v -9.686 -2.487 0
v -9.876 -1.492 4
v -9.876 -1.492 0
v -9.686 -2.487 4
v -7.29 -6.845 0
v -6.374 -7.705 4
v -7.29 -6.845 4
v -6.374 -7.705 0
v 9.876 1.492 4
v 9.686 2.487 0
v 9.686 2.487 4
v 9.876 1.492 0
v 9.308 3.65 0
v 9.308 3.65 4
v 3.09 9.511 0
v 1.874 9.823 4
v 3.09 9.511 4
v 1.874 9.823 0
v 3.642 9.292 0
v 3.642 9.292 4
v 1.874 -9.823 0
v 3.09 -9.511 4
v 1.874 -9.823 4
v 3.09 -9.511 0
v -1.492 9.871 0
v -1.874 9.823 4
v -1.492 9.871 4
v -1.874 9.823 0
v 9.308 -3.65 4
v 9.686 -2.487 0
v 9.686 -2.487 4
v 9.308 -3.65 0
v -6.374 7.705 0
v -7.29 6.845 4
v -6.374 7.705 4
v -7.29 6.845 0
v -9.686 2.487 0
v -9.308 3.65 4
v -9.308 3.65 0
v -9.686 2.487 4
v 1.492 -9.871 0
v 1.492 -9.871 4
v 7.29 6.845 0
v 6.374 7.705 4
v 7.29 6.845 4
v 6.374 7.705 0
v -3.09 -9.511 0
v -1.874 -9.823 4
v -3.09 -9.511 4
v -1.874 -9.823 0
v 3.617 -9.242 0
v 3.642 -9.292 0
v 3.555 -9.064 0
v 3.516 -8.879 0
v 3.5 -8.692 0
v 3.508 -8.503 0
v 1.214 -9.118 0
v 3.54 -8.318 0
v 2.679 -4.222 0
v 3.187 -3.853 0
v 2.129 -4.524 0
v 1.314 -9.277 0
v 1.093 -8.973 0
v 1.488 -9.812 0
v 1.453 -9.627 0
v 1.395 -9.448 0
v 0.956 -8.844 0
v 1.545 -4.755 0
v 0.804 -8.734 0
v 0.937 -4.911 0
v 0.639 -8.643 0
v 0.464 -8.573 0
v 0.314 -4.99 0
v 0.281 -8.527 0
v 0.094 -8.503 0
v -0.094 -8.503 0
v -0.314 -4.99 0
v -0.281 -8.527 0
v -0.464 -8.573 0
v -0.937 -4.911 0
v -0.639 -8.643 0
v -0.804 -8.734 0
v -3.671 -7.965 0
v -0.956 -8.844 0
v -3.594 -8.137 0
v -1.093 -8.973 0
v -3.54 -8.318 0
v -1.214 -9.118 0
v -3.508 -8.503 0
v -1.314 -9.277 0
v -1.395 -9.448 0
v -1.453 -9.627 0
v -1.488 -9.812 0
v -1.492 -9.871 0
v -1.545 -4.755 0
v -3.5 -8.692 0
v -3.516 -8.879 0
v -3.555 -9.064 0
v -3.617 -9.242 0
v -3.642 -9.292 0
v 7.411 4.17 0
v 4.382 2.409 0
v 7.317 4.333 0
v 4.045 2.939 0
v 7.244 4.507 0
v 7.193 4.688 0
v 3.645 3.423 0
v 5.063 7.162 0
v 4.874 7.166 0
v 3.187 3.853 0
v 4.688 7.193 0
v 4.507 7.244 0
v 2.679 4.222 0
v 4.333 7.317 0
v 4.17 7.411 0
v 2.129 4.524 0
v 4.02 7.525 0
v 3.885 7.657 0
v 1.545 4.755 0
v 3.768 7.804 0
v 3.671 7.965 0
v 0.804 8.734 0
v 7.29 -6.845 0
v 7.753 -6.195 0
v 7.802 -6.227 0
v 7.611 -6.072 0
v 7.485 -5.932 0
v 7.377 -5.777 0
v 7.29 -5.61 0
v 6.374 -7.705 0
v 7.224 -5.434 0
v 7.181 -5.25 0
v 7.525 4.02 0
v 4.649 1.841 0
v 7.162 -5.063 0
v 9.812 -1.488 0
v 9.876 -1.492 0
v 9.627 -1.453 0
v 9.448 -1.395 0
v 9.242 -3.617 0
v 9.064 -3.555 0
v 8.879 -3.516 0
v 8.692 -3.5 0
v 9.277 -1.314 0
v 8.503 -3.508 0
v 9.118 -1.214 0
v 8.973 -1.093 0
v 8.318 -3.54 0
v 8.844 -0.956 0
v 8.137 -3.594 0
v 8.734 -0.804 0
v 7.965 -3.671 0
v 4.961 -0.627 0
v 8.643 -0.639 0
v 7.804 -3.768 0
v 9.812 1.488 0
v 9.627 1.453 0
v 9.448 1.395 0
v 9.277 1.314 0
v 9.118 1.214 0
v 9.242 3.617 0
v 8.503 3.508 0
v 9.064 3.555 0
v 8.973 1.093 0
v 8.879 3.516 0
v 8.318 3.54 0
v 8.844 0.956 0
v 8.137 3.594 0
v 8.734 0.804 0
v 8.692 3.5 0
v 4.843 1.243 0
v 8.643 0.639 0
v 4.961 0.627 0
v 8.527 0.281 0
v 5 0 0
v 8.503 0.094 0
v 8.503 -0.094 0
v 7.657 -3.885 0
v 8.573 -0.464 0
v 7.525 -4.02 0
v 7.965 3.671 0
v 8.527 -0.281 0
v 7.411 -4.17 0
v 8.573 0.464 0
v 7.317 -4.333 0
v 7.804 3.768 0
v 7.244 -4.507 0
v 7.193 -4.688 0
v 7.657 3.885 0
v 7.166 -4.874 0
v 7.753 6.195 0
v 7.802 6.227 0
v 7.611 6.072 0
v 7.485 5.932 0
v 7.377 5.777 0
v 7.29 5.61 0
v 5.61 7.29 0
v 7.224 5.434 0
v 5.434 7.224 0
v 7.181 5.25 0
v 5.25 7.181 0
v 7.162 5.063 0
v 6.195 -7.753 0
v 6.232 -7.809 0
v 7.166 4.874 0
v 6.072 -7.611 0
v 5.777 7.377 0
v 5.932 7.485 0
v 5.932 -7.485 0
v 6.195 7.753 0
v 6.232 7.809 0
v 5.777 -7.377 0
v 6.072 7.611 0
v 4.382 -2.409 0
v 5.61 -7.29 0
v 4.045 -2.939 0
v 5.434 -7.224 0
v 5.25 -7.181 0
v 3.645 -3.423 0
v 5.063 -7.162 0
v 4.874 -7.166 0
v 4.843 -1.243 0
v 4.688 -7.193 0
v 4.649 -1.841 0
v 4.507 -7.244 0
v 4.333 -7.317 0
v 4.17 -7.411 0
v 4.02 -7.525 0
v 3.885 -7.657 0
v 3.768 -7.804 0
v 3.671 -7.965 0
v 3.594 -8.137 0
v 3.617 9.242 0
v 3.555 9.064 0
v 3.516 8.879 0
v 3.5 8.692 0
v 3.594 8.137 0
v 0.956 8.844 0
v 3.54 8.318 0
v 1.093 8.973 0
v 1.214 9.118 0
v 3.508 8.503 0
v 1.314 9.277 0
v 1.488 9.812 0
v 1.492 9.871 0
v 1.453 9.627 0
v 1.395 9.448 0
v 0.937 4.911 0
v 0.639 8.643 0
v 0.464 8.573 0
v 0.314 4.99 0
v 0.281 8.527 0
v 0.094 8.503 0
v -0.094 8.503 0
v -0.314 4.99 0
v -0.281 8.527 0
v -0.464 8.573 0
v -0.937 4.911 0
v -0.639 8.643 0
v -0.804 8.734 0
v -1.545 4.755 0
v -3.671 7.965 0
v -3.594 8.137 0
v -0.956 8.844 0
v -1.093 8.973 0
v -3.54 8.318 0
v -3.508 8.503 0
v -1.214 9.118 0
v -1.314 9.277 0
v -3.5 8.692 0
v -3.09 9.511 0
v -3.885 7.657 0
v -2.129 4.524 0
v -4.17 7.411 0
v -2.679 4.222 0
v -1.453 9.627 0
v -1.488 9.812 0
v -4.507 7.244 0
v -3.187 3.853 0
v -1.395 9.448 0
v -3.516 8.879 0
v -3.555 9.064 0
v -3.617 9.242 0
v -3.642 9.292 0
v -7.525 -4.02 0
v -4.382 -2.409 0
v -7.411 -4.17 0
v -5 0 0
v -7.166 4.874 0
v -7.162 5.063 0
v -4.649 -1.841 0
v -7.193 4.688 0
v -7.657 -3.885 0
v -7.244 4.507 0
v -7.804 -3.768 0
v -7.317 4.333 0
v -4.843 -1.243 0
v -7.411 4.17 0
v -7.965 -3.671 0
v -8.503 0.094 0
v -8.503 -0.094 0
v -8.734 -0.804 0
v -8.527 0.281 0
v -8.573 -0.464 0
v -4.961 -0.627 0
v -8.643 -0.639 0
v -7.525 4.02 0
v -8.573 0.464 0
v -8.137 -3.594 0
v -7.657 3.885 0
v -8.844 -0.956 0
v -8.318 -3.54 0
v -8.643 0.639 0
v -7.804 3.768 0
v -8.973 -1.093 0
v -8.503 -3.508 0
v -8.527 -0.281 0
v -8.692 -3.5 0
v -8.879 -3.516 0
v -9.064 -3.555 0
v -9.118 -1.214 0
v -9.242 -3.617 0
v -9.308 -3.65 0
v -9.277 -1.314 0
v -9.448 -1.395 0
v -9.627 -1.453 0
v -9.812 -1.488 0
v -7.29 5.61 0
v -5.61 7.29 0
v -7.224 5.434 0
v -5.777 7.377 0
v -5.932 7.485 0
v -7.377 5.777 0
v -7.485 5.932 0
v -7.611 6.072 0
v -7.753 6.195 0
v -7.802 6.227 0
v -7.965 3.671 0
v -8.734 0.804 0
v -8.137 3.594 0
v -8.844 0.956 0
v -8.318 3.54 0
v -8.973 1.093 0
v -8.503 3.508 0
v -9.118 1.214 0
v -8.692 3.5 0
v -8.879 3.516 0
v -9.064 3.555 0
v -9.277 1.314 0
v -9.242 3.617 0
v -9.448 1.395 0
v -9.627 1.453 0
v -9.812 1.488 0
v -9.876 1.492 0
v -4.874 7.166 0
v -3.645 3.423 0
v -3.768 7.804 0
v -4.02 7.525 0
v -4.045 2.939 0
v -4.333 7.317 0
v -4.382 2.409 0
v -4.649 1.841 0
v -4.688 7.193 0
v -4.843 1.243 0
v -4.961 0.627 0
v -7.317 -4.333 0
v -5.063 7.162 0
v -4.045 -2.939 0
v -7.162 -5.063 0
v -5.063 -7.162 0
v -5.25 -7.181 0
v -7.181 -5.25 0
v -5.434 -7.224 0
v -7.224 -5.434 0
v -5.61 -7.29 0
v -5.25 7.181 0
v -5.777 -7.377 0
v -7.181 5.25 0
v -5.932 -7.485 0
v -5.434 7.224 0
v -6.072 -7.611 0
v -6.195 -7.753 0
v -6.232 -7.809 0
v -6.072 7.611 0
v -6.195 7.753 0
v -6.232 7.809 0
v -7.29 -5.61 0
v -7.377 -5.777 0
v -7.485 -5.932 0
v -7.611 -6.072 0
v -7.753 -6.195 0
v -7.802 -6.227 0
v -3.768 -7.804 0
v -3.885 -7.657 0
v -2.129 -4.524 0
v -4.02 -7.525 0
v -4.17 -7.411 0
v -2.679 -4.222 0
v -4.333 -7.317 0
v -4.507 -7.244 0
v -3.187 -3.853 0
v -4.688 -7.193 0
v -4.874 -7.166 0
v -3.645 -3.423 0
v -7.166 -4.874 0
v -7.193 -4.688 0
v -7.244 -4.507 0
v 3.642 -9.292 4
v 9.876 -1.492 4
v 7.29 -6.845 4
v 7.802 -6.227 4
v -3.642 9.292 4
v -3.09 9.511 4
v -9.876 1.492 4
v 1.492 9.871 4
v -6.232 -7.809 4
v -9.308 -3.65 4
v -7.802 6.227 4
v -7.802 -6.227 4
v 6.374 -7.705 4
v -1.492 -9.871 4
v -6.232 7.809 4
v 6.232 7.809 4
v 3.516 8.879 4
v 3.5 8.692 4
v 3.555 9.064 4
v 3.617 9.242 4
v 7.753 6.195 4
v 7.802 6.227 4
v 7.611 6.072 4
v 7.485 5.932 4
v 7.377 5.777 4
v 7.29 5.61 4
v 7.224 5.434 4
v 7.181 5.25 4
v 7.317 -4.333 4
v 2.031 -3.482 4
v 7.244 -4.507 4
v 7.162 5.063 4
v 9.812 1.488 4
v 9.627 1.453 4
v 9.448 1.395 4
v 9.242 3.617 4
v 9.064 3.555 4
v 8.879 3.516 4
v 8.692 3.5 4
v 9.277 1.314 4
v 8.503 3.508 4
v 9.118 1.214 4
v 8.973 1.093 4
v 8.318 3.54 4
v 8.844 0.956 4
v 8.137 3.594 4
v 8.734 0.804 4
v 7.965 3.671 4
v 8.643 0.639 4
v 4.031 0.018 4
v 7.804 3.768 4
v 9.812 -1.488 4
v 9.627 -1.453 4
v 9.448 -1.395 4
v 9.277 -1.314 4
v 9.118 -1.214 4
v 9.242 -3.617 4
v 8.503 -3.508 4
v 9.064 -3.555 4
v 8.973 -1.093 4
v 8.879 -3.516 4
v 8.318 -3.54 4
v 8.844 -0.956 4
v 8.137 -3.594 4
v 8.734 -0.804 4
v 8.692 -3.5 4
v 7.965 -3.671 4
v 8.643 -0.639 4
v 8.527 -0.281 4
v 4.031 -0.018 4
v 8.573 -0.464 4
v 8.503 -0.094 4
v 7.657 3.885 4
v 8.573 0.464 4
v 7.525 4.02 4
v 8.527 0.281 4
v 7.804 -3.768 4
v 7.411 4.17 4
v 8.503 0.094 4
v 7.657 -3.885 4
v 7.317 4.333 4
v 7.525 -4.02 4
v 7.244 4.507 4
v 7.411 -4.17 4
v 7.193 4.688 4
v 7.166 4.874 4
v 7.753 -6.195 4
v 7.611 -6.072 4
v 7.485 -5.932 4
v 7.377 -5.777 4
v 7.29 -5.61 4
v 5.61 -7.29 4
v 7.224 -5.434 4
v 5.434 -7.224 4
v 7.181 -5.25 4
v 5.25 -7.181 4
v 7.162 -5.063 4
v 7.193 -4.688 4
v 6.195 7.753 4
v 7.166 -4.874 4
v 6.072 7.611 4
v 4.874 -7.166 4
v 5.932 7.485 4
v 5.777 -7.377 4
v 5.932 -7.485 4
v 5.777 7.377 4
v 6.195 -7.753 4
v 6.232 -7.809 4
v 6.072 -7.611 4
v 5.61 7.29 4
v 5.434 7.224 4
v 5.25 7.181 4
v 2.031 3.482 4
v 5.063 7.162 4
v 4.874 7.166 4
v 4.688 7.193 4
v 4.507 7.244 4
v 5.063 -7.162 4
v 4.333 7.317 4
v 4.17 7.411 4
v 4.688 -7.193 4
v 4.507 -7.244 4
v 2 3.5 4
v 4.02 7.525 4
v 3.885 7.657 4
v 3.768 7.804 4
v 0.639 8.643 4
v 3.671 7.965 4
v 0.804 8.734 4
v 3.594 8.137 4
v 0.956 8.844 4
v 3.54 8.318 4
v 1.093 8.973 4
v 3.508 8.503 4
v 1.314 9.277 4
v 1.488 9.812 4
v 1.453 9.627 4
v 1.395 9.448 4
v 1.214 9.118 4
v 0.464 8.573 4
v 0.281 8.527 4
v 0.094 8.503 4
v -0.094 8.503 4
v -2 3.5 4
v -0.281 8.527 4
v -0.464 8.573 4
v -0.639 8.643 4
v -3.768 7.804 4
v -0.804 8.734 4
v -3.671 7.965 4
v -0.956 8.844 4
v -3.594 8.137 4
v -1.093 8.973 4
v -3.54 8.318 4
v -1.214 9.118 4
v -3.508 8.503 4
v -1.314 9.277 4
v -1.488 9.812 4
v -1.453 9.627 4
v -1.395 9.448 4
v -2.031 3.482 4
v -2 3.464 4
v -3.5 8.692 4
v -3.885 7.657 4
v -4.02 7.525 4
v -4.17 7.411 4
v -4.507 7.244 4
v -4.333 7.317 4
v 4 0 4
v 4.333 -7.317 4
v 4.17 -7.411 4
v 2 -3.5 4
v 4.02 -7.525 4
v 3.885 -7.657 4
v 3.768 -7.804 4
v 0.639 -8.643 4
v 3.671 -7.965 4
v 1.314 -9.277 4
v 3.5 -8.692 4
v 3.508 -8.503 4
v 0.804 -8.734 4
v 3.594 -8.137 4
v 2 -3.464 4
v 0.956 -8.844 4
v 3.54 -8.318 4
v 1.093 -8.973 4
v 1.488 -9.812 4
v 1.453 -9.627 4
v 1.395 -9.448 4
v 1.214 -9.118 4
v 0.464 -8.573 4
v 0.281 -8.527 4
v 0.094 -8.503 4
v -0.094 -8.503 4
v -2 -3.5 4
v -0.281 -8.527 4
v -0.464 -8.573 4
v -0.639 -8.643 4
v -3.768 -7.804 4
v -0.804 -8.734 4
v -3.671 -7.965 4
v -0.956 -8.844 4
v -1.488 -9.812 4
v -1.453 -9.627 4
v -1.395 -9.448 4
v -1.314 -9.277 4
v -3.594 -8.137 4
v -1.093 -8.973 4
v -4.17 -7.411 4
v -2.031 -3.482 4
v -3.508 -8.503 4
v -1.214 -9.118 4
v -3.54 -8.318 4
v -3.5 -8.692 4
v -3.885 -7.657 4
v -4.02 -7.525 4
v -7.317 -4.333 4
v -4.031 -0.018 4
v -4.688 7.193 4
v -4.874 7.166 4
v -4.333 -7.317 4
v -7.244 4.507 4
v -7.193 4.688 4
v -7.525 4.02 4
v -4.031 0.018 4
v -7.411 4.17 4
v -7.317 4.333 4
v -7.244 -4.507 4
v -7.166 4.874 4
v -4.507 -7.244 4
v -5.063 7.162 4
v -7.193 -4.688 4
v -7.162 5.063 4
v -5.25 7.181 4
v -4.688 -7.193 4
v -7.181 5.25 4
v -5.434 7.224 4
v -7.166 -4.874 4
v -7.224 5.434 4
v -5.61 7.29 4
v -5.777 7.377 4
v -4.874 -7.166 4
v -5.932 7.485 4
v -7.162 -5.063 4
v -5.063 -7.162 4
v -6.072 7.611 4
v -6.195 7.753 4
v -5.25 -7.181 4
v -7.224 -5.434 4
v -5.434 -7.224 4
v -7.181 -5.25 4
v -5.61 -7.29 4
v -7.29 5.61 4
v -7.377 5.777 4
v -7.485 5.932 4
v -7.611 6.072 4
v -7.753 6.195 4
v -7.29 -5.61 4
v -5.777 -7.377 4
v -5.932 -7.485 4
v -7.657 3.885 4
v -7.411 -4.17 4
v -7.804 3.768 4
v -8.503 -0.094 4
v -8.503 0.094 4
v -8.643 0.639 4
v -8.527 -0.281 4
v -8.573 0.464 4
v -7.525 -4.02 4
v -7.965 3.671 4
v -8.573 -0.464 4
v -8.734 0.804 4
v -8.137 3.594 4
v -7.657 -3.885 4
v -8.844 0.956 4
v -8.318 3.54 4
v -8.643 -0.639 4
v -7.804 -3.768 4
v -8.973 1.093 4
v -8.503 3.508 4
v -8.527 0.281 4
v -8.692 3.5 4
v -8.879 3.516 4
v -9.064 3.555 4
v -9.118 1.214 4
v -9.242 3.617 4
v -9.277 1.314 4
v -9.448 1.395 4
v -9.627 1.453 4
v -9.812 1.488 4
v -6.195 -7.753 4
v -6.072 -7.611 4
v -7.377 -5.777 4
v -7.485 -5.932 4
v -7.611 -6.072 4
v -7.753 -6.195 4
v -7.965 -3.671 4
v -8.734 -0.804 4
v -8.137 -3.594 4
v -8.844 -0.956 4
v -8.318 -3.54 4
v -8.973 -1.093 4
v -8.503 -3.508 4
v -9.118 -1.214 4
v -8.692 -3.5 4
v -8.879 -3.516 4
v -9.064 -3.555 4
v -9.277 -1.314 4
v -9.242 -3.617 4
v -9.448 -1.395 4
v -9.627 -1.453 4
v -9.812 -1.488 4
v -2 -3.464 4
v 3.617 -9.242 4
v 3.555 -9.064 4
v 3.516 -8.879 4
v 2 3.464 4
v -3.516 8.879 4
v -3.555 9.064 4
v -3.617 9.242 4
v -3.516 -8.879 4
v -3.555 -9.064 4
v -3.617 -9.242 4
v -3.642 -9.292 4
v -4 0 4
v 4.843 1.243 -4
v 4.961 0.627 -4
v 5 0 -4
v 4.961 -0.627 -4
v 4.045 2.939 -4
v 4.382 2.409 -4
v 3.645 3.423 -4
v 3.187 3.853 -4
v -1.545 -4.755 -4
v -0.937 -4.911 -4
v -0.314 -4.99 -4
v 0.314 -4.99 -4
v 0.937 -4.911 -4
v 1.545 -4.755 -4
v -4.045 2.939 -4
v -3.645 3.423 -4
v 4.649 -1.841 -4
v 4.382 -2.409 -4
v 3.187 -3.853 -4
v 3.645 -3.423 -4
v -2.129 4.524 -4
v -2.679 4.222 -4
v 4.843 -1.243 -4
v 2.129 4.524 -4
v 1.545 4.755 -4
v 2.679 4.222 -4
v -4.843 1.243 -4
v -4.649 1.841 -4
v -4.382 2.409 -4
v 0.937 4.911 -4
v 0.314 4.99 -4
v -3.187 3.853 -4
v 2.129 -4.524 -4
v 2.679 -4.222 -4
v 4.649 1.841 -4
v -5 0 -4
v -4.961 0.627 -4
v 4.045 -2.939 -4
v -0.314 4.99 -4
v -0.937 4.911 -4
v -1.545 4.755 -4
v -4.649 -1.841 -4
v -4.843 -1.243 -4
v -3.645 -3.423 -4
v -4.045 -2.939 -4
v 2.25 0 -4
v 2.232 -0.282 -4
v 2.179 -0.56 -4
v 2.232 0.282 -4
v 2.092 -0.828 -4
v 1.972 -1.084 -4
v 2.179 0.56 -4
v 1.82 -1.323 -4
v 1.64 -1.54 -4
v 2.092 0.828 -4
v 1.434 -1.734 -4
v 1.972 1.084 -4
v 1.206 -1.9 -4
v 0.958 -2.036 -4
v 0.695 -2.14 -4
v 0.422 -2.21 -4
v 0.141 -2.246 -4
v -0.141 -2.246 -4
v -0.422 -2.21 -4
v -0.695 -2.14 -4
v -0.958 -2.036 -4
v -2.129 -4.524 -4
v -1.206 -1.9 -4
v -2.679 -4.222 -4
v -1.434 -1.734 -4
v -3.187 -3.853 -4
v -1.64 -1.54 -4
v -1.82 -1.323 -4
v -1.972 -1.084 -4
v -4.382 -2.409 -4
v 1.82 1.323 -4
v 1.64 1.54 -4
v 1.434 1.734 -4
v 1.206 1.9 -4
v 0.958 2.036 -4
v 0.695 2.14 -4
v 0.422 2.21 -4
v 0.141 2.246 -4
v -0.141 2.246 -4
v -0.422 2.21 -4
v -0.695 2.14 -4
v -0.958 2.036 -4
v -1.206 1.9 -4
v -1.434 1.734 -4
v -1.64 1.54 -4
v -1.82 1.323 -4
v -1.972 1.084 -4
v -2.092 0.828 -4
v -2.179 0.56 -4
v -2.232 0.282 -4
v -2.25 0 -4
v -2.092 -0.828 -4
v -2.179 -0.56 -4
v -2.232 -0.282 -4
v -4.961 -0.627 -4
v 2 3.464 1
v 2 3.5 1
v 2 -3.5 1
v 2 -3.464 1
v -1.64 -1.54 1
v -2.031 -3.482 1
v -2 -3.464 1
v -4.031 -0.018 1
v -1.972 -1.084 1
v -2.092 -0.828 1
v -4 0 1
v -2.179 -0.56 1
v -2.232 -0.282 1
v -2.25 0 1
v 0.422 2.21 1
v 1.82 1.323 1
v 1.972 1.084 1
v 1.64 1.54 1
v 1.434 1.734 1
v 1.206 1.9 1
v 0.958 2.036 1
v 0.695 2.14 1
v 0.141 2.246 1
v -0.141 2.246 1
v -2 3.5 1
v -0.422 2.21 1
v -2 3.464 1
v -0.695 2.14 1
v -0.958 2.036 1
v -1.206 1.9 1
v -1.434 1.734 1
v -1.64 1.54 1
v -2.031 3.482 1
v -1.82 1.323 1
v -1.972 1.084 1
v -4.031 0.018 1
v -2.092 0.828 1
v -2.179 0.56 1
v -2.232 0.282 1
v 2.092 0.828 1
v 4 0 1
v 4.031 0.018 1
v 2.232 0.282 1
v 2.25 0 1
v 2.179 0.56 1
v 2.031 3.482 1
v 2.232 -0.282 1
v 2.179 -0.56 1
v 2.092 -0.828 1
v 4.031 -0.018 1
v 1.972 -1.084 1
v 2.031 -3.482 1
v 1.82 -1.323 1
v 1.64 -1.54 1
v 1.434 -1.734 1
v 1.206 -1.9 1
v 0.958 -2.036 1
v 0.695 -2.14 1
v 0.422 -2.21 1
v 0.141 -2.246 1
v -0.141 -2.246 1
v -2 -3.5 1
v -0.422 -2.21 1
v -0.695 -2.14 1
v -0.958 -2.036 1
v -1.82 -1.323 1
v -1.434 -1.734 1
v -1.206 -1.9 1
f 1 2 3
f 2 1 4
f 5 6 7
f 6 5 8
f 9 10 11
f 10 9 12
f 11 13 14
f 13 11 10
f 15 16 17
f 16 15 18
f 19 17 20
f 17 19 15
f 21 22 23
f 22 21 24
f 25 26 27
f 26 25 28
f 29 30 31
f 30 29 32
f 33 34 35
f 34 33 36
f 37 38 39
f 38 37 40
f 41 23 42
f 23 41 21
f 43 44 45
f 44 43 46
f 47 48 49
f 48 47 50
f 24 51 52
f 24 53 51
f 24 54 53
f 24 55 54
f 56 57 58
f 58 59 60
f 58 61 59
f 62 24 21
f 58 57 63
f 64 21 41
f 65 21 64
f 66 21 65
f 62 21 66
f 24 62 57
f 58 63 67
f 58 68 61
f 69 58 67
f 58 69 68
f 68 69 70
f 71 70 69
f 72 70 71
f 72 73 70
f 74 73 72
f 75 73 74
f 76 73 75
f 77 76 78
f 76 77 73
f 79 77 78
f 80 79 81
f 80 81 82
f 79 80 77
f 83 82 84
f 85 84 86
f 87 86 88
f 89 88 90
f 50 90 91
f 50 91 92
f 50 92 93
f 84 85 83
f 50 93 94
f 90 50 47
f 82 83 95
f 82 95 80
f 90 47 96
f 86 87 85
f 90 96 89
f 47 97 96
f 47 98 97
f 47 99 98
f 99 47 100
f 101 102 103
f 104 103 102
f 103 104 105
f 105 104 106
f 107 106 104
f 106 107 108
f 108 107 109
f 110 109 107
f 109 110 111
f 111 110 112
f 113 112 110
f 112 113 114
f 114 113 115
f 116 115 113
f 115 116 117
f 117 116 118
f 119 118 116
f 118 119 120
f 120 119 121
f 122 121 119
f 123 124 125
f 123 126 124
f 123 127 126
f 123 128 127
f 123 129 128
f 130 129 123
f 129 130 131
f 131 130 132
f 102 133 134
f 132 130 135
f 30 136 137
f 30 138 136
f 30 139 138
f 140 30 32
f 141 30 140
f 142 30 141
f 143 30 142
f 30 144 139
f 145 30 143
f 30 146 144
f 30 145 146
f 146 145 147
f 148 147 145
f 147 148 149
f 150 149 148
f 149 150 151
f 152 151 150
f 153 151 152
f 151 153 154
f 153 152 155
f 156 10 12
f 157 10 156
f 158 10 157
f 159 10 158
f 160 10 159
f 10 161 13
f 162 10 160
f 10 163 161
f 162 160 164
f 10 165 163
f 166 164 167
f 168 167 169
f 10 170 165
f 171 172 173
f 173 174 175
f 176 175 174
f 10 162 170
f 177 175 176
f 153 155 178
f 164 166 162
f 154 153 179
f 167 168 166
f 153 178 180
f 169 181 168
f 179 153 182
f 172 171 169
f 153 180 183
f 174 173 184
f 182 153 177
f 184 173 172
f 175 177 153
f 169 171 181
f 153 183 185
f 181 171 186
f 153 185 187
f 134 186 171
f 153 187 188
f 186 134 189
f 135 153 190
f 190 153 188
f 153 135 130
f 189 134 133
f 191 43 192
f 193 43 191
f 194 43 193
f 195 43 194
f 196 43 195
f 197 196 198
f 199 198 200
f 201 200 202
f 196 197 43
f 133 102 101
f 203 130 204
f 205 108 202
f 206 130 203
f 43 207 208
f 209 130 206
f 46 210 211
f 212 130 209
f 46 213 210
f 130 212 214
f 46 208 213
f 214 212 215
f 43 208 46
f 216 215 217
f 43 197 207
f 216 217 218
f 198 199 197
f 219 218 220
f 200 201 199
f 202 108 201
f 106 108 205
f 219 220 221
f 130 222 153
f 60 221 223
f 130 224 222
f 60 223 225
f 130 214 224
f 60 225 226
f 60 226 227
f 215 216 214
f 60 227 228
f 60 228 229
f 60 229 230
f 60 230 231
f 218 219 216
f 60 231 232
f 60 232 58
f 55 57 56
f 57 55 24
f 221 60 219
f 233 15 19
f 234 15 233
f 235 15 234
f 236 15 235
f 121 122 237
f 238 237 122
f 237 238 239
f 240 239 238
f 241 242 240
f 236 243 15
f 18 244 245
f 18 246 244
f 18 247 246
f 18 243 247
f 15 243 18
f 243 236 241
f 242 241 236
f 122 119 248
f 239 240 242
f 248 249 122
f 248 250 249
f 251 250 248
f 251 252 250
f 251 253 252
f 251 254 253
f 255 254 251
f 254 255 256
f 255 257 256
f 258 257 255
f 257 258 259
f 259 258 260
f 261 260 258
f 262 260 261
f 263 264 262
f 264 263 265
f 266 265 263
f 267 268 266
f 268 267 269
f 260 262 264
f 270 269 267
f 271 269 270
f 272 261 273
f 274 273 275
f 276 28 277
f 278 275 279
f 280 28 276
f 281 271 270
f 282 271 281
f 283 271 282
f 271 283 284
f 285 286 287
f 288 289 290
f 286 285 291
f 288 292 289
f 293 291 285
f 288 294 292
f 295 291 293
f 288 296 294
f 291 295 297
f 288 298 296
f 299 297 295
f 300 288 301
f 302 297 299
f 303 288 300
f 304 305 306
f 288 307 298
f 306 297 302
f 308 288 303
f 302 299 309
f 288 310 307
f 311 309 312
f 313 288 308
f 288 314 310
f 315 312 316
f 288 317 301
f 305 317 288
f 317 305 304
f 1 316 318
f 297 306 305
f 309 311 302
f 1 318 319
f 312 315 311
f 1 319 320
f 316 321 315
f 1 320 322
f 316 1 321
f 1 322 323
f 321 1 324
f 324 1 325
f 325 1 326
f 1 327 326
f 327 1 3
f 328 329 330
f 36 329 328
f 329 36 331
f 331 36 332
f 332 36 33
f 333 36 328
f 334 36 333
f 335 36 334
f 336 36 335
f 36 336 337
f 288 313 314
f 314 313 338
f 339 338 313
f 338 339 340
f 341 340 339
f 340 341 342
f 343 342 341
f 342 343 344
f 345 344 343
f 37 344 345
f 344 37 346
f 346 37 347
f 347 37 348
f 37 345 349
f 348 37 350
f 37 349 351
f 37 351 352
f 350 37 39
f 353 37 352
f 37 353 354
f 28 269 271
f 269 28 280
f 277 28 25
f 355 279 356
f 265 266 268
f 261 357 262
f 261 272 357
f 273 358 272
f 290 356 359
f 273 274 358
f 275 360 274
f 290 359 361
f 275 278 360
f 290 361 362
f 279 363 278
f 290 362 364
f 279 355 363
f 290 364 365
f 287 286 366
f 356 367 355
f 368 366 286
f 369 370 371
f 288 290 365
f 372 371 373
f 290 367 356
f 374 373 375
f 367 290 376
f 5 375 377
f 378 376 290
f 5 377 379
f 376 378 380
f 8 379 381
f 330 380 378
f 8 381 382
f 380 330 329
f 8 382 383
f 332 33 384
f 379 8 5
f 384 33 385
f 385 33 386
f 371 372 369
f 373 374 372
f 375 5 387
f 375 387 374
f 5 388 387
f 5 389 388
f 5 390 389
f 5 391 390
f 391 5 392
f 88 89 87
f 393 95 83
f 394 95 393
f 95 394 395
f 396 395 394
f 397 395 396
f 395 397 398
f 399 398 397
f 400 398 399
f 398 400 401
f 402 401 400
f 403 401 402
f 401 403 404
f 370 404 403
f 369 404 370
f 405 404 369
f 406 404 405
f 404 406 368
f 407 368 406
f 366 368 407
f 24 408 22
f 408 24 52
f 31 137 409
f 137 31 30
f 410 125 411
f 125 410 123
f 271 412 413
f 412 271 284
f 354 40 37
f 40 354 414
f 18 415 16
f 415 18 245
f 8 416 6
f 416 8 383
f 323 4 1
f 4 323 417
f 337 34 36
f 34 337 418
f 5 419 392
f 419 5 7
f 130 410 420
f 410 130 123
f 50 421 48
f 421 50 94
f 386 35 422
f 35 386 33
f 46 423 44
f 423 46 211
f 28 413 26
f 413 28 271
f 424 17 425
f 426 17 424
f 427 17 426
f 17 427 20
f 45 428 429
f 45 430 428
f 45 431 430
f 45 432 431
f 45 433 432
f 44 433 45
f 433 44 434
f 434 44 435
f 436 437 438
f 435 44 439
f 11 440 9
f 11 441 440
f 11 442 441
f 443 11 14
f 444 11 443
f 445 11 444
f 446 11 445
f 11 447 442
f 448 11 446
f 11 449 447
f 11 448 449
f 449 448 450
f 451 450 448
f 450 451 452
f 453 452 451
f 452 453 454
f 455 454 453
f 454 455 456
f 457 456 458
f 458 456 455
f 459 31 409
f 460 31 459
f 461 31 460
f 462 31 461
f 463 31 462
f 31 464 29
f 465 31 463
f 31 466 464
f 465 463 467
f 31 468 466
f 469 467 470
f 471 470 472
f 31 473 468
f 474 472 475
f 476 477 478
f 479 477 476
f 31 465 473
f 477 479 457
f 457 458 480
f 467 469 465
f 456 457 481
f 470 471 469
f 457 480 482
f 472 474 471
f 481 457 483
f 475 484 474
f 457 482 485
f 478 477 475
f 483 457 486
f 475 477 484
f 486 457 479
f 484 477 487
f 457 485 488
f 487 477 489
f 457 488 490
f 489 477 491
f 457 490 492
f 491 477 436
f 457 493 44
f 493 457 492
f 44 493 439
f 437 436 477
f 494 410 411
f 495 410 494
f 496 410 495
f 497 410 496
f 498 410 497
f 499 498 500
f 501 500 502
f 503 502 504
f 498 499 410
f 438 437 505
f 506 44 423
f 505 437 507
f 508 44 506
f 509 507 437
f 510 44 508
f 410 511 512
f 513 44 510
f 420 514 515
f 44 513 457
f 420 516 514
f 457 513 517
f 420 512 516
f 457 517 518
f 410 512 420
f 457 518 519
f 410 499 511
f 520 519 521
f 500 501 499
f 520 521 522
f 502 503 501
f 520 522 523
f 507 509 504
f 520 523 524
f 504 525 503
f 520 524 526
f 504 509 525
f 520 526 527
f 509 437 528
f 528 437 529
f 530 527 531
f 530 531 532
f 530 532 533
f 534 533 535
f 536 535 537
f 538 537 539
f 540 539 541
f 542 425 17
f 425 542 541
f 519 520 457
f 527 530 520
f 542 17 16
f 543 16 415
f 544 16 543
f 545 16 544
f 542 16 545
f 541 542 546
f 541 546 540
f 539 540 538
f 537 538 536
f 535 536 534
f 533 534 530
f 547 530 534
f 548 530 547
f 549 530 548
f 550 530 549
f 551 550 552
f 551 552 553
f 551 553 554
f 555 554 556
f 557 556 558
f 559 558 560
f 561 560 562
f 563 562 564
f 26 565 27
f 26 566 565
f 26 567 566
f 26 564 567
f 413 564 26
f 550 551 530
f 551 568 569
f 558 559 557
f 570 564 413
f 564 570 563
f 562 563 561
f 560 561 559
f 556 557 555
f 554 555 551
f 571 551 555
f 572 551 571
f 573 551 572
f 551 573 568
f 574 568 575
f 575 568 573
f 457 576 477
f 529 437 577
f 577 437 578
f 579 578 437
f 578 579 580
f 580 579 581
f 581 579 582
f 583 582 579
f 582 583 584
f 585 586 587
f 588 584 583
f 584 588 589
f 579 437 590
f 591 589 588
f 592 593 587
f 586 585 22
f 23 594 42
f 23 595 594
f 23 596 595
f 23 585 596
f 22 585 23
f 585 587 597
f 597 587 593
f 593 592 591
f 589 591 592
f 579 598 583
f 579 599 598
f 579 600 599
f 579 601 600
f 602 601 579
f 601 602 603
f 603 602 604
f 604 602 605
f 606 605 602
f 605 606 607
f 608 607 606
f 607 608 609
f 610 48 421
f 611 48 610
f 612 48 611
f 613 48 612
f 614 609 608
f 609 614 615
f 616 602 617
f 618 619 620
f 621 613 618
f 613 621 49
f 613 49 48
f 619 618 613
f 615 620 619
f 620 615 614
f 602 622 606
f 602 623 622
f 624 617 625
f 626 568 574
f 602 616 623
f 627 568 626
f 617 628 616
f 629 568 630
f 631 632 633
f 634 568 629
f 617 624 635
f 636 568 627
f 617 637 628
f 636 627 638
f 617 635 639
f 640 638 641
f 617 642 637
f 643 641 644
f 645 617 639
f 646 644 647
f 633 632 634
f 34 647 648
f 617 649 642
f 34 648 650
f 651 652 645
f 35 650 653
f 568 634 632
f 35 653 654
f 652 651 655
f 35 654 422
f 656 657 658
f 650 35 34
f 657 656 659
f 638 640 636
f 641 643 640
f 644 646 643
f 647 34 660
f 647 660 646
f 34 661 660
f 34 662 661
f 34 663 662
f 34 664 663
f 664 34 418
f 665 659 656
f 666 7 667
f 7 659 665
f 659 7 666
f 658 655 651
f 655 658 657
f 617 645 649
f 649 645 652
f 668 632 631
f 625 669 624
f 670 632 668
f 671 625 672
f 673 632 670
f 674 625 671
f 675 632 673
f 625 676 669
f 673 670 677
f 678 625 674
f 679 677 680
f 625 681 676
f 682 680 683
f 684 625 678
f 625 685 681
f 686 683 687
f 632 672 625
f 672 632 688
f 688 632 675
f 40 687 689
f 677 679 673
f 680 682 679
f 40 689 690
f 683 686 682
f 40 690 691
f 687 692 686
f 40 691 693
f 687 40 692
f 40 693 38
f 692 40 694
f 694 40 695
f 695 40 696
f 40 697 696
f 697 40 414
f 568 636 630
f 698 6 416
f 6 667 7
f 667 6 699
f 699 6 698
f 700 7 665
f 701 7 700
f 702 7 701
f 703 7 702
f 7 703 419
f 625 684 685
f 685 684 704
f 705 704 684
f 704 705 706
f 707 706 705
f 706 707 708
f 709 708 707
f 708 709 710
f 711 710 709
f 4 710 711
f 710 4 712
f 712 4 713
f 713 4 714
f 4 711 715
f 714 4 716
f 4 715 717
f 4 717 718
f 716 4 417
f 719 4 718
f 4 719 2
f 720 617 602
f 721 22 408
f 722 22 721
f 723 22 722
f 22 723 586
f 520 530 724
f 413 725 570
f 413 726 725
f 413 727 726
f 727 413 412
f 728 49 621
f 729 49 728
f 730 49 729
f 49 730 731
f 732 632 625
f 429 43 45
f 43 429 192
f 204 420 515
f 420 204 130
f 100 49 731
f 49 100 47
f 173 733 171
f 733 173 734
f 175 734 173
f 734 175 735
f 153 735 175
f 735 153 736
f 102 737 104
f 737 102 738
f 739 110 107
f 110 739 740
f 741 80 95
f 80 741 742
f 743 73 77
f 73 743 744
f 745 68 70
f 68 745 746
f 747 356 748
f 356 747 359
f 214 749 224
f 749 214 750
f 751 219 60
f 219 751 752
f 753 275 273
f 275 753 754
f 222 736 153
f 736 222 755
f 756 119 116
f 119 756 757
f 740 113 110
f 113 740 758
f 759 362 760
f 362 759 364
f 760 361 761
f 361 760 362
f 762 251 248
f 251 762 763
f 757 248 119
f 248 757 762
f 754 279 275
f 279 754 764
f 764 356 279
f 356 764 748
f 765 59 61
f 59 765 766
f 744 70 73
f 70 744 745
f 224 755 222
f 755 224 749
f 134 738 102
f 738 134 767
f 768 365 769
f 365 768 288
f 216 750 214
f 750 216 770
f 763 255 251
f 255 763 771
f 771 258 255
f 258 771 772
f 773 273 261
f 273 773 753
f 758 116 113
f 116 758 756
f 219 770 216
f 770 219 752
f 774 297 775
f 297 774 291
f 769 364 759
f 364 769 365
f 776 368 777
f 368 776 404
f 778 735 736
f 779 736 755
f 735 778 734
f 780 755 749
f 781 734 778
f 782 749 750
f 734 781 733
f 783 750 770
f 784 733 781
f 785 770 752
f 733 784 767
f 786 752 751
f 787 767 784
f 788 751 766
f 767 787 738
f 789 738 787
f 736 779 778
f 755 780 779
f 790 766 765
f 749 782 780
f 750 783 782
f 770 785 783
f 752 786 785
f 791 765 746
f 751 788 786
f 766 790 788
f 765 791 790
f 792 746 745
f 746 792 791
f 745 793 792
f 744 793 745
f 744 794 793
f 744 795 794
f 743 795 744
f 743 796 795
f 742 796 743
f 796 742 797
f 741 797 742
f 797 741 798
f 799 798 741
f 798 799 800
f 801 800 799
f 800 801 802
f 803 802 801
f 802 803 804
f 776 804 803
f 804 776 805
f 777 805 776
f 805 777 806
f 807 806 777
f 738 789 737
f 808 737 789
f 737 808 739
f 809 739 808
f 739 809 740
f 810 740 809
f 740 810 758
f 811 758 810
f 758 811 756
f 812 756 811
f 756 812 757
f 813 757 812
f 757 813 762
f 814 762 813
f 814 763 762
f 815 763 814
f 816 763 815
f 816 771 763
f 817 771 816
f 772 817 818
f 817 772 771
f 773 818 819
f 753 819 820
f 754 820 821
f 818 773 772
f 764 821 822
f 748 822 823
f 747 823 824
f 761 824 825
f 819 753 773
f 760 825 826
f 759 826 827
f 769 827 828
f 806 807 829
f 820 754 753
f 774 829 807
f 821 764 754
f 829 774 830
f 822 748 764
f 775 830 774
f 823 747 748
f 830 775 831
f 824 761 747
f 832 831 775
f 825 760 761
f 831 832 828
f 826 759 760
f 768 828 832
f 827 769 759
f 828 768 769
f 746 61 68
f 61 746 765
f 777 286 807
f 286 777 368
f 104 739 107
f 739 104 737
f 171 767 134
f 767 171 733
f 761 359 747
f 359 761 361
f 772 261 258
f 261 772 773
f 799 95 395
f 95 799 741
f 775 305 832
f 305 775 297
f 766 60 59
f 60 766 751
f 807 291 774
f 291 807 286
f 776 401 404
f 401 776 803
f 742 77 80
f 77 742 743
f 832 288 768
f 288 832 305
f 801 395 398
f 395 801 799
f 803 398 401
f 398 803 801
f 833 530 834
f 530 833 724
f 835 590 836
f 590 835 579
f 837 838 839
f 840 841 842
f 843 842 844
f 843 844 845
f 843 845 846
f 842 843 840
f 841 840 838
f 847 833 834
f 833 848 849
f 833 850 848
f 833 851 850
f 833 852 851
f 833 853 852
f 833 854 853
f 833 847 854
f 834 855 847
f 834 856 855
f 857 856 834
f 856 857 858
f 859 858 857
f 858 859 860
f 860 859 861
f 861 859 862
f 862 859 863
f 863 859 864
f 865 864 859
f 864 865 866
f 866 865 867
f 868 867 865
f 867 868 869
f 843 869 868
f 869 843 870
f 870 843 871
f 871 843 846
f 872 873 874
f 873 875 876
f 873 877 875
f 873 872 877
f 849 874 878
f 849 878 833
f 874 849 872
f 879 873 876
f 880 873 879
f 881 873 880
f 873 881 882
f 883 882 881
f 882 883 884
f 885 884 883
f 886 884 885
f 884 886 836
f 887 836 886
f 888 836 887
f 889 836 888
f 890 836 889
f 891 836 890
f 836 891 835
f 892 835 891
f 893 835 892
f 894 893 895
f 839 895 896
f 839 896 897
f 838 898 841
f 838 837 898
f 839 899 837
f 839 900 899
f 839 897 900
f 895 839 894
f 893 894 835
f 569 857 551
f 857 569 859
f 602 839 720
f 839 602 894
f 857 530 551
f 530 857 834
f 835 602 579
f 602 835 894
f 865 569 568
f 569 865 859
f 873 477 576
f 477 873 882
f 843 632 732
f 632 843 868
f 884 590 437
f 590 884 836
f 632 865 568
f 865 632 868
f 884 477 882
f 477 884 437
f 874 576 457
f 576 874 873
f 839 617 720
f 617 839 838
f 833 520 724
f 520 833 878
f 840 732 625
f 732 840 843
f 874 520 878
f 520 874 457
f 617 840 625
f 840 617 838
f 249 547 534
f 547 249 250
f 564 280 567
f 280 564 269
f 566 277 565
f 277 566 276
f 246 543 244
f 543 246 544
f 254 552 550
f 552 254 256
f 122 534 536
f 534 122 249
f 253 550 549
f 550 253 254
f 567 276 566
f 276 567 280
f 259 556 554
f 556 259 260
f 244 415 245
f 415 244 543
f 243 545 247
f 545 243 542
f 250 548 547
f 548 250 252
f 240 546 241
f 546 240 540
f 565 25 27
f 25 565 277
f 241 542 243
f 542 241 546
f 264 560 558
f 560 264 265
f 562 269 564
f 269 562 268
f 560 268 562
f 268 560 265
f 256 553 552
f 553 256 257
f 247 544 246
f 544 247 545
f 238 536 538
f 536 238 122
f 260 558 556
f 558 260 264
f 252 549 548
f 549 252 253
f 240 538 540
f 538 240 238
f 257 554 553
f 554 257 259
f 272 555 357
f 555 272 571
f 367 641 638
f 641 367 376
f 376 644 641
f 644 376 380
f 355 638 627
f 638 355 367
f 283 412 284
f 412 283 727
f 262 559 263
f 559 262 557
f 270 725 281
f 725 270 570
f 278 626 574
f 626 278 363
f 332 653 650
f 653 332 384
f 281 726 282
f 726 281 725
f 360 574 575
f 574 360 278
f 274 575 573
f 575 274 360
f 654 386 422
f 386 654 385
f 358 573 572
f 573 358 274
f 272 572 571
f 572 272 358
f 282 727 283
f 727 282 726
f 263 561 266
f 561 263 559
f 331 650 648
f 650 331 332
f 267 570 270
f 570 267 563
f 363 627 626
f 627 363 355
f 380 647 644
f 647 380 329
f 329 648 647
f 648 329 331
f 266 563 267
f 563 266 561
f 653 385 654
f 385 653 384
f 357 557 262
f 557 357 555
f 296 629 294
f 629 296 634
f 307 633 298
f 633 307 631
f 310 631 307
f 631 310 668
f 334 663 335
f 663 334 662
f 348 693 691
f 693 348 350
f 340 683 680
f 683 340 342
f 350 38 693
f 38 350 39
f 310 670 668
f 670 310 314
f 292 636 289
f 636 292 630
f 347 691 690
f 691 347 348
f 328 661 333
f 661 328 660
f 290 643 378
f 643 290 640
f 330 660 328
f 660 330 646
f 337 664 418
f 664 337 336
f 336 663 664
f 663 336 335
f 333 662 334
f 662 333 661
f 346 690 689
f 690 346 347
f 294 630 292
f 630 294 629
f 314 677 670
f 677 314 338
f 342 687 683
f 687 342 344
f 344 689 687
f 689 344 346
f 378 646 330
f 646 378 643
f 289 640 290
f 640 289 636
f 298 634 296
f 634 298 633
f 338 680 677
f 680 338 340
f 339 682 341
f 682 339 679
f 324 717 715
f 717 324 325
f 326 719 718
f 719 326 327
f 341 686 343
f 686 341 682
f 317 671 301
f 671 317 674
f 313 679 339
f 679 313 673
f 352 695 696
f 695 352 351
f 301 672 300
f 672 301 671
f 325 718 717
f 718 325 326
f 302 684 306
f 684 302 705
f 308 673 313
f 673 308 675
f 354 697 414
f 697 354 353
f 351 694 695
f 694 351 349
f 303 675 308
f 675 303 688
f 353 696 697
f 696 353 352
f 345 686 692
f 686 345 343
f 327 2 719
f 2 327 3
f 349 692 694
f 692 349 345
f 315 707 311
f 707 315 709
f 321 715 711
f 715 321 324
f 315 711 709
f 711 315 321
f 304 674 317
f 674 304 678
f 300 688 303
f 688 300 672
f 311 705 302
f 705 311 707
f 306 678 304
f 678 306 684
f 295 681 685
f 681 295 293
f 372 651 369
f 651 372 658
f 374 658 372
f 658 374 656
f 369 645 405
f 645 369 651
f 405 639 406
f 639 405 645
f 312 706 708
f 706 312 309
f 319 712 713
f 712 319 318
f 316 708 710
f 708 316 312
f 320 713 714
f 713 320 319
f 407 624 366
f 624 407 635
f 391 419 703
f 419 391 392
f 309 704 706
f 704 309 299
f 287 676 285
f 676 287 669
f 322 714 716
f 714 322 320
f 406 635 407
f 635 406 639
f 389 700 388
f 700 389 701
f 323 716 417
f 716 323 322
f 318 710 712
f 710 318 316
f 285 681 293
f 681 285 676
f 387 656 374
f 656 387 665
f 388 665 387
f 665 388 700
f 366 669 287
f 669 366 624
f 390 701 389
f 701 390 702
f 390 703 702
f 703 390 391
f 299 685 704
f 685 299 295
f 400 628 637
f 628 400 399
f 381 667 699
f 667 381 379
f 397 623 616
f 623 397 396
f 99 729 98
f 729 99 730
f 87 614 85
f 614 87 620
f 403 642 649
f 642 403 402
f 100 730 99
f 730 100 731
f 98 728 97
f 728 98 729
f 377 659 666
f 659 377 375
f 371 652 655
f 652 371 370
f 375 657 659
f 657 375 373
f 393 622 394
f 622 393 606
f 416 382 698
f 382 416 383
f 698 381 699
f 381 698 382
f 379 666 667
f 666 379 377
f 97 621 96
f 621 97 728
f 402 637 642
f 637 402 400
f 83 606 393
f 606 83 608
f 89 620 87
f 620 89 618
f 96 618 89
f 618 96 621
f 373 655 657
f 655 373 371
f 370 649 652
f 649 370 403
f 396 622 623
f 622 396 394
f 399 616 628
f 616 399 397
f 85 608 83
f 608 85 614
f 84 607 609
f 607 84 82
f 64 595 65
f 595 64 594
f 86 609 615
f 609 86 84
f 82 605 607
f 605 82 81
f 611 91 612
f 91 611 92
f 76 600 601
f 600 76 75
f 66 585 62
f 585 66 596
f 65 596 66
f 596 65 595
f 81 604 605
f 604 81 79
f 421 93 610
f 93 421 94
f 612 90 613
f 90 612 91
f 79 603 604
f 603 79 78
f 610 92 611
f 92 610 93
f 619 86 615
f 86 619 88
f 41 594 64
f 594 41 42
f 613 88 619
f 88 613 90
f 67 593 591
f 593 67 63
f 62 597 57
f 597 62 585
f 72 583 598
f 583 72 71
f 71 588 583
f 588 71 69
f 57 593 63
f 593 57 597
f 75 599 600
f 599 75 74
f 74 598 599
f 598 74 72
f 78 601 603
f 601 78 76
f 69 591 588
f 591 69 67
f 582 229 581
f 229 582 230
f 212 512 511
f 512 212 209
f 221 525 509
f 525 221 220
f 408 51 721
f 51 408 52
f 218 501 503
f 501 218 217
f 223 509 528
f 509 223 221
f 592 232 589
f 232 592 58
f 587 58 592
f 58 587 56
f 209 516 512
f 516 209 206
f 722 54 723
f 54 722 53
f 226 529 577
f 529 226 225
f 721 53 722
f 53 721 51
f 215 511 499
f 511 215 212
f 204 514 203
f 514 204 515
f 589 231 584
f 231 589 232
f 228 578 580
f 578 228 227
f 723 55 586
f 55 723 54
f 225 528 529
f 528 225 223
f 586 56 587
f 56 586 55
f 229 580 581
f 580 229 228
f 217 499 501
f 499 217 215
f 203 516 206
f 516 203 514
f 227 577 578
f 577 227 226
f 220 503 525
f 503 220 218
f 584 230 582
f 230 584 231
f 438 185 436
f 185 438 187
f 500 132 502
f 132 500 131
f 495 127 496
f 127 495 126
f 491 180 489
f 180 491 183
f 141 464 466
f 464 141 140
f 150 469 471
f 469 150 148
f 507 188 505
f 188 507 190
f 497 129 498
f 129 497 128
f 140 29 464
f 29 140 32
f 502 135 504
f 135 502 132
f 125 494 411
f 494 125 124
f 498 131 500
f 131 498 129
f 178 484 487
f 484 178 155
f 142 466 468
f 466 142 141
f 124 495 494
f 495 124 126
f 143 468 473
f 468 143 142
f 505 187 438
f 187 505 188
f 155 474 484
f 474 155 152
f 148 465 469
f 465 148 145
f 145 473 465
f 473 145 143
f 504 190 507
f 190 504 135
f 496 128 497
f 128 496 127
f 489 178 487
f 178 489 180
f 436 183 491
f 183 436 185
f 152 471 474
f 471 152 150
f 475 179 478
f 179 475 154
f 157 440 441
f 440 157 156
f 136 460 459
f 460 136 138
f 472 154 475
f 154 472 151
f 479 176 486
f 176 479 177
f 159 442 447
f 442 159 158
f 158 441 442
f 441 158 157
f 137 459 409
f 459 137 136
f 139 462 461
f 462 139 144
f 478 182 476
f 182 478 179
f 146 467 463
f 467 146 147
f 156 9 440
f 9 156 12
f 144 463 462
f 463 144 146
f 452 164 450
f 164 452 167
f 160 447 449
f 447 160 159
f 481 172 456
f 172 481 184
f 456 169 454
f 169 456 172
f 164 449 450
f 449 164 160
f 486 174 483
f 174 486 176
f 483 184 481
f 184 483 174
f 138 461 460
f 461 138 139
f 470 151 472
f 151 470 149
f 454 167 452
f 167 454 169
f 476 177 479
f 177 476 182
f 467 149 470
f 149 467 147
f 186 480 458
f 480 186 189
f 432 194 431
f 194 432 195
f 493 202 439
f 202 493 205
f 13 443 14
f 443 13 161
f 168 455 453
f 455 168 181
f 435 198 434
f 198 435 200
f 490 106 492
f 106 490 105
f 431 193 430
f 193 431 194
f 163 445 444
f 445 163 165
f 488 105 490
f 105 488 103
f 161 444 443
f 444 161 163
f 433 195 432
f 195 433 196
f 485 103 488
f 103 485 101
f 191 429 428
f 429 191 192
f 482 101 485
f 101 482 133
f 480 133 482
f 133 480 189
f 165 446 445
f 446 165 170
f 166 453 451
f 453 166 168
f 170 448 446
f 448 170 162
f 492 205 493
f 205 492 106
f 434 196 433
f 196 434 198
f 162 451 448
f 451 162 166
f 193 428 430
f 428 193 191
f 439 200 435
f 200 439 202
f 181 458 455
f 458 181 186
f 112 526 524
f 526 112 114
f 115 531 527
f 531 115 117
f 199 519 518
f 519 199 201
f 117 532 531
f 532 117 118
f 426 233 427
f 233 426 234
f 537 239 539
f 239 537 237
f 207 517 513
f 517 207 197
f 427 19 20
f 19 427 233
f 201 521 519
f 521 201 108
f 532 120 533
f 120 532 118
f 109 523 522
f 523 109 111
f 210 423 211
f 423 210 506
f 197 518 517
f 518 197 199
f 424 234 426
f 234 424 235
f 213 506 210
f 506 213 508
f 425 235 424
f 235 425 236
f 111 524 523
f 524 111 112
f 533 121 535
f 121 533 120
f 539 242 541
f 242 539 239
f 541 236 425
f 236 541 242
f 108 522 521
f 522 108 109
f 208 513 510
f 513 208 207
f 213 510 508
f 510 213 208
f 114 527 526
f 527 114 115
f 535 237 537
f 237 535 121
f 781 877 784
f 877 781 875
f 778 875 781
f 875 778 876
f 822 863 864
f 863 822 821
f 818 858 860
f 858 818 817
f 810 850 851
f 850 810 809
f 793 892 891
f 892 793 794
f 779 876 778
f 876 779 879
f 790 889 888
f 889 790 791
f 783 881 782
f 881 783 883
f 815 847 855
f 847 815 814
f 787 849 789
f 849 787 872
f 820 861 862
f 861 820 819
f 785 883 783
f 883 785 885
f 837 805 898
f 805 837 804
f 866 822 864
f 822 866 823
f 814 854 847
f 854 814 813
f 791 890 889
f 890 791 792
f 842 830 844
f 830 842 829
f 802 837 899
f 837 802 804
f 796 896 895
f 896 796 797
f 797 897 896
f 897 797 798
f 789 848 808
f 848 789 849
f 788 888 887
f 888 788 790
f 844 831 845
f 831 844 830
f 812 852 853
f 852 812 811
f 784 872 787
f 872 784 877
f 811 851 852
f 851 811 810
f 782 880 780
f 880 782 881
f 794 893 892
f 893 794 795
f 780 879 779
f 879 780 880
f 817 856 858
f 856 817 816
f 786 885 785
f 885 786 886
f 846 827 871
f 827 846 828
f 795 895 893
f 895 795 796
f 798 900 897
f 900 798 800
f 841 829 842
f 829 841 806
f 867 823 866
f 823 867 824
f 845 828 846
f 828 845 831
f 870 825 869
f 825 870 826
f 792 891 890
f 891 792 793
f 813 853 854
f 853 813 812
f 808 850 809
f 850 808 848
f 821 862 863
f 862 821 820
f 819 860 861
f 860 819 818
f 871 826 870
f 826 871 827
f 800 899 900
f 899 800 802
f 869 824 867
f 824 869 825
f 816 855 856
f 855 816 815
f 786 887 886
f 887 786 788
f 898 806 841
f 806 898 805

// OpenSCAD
// ******************************
// *   Parametric thumb wheel   *
// *   by Chris Garrett         *
// *   20-nov-2011			   *
// *	   Spacer added             *
// *	   by Bas Spaans            *
// *	   10-jan-2013              *
// ******************************


// *** Configuration variables ***
wheel_d = 20;    // Outer Diameter of the thumb wheel
wheel_h = 4;     // Height of the thumb wheel
hole_d = 4.5;    // Diameter of center hole
hex_sz = 7;      // Size of the hex (nut trap)
                 // An M4 nut fits perfectly in a 7mm hex opening made on my Prusa
hex_d = 3;       // Depth of the hex (set this < or = to wheel_h)
knurl_cnt = 12;  // Number of cutouts around the wheel
knurl_d = 3;     // Diameter of the cutouts

spacer_h = 4;	// Height of the spacer
spacer_d = 10;	// Diameter of the spacer


// *** Code area ***

module box(w,h,d) {
 translate([0,0,d/2]) scale ([w,h,d]) cube(1, true);
}

module hexagon(height, depth) {
 boxWidth=height/1.75;
 union() {
  box(boxWidth, height, depth);
  rotate([0,0,60]) box(boxWidth, height, depth);
  rotate([0,0,-60]) box(boxWidth, height, depth);
 }
}


// The thumb wheel 

difference() {
 union() {
	cylinder(h=wheel_h, r=wheel_d/2, $fn=50);
	translate([0,0,-spacer_h]) cylinder(h=spacer_h, r=spacer_d/2, $fn=50); 
	}
 translate([0,0,-(spacer_h+1)]) cylinder(h=wheel_h+spacer_h+2, r=hole_d/2, $fn=50);
 if (hex_d >= wheel_h) {
   translate([0,0,-1]) hexagon(height=hex_sz, depth=wheel_d+2);
 } else {
  translate([0,0,wheel_h-hex_d]) hexagon(height=hex_sz, depth=hex_d+1);
 }
 for(i = [0:knurl_cnt-1]) {
  rotate(v=[0,0,1], a=i*360/knurl_cnt) translate([0,wheel_d/2,-1]) cylinder(h=wheel_h+2, r=knurl_d/2, $fn=50);
 }
}
